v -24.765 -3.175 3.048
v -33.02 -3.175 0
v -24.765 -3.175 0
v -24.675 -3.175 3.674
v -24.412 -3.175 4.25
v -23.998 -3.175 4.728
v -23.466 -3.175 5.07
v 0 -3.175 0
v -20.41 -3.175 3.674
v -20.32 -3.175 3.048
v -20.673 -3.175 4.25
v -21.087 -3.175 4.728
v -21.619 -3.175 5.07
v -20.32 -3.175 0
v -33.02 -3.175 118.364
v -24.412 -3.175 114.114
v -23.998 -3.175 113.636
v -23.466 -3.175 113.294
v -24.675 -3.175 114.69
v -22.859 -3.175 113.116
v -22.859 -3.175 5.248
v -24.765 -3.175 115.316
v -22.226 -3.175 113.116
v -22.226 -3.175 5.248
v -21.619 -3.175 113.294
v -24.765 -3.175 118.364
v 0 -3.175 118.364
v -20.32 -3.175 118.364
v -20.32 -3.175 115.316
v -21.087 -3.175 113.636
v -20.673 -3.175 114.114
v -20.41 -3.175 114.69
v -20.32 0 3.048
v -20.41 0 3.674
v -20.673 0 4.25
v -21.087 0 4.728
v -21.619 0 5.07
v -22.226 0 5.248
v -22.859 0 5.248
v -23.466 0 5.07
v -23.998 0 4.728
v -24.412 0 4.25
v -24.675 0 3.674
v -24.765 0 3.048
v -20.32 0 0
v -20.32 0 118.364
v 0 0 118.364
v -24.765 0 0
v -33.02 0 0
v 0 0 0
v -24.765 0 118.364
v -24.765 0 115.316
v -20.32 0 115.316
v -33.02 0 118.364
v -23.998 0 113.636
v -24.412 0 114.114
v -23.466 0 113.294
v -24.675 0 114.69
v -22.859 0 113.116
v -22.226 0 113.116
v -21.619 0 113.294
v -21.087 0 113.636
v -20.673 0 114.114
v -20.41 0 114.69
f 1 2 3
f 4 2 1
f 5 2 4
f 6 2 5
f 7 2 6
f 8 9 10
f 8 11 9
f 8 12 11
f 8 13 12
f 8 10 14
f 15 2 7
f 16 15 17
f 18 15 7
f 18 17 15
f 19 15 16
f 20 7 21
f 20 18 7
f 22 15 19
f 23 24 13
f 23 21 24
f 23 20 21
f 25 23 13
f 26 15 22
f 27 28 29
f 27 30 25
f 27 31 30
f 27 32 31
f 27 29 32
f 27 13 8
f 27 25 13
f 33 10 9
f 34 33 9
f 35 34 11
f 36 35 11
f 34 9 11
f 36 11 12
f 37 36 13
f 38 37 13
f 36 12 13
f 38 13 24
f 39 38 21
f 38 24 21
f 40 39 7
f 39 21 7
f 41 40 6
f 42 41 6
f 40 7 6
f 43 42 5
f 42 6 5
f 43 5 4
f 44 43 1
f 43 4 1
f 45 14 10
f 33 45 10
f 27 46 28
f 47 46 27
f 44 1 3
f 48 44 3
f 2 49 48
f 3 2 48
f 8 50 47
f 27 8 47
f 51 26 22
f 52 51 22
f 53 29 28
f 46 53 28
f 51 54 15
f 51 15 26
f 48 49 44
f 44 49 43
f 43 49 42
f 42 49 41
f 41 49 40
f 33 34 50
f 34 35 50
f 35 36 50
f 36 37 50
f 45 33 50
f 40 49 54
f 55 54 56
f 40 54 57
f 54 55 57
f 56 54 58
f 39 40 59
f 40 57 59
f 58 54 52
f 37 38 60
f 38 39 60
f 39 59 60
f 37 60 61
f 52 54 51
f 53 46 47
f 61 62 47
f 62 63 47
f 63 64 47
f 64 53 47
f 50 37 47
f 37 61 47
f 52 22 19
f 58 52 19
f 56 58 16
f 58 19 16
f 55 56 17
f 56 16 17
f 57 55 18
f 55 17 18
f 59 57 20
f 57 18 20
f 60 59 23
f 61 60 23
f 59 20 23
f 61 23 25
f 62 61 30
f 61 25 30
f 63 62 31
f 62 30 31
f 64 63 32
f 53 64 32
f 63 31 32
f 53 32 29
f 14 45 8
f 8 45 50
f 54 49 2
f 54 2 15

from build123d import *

# Parameters (mm, degrees)
F0_W     = 33.02
F0_H     = 118.364
F1_DEPTH = 3.175
F3_DEPTH = 3.176


with BuildPart() as f1:
    # F0 (on Front) → F1 (new body)
    with BuildSketch(Plane.XZ):
        with Locations((-16.51, 59.182)):
            Rectangle(F0_W, F0_H)
    extrude(amount=F1_DEPTH)

    # F2 (on face) → F3 (cut, through all)
    with BuildSketch(Plane.XZ.offset(3.175)):
        with BuildLine():
            Line((-24.765, 3.048), (-24.765, 0))
            Line((-24.765, 0), (-20.32, 0))
            Line((-20.32, 0), (-20.32, 3.048))
            ThreePointArc((-20.32, 3.048), (-22.5425, 5.2705), (-24.765, 3.048))
        make_face()
        with BuildLine():
            Line((-24.765, 118.364), (-24.765, 115.316))
            ThreePointArc((-24.765, 115.316), (-22.5425, 113.0935), (-20.32, 115.316))
            Line((-20.32, 115.316), (-20.32, 118.364))
            Line((-20.32, 118.364), (-24.765, 118.364))
        make_face()
    extrude(amount=-F3_DEPTH, mode=Mode.SUBTRACT)


solid = f1.part
